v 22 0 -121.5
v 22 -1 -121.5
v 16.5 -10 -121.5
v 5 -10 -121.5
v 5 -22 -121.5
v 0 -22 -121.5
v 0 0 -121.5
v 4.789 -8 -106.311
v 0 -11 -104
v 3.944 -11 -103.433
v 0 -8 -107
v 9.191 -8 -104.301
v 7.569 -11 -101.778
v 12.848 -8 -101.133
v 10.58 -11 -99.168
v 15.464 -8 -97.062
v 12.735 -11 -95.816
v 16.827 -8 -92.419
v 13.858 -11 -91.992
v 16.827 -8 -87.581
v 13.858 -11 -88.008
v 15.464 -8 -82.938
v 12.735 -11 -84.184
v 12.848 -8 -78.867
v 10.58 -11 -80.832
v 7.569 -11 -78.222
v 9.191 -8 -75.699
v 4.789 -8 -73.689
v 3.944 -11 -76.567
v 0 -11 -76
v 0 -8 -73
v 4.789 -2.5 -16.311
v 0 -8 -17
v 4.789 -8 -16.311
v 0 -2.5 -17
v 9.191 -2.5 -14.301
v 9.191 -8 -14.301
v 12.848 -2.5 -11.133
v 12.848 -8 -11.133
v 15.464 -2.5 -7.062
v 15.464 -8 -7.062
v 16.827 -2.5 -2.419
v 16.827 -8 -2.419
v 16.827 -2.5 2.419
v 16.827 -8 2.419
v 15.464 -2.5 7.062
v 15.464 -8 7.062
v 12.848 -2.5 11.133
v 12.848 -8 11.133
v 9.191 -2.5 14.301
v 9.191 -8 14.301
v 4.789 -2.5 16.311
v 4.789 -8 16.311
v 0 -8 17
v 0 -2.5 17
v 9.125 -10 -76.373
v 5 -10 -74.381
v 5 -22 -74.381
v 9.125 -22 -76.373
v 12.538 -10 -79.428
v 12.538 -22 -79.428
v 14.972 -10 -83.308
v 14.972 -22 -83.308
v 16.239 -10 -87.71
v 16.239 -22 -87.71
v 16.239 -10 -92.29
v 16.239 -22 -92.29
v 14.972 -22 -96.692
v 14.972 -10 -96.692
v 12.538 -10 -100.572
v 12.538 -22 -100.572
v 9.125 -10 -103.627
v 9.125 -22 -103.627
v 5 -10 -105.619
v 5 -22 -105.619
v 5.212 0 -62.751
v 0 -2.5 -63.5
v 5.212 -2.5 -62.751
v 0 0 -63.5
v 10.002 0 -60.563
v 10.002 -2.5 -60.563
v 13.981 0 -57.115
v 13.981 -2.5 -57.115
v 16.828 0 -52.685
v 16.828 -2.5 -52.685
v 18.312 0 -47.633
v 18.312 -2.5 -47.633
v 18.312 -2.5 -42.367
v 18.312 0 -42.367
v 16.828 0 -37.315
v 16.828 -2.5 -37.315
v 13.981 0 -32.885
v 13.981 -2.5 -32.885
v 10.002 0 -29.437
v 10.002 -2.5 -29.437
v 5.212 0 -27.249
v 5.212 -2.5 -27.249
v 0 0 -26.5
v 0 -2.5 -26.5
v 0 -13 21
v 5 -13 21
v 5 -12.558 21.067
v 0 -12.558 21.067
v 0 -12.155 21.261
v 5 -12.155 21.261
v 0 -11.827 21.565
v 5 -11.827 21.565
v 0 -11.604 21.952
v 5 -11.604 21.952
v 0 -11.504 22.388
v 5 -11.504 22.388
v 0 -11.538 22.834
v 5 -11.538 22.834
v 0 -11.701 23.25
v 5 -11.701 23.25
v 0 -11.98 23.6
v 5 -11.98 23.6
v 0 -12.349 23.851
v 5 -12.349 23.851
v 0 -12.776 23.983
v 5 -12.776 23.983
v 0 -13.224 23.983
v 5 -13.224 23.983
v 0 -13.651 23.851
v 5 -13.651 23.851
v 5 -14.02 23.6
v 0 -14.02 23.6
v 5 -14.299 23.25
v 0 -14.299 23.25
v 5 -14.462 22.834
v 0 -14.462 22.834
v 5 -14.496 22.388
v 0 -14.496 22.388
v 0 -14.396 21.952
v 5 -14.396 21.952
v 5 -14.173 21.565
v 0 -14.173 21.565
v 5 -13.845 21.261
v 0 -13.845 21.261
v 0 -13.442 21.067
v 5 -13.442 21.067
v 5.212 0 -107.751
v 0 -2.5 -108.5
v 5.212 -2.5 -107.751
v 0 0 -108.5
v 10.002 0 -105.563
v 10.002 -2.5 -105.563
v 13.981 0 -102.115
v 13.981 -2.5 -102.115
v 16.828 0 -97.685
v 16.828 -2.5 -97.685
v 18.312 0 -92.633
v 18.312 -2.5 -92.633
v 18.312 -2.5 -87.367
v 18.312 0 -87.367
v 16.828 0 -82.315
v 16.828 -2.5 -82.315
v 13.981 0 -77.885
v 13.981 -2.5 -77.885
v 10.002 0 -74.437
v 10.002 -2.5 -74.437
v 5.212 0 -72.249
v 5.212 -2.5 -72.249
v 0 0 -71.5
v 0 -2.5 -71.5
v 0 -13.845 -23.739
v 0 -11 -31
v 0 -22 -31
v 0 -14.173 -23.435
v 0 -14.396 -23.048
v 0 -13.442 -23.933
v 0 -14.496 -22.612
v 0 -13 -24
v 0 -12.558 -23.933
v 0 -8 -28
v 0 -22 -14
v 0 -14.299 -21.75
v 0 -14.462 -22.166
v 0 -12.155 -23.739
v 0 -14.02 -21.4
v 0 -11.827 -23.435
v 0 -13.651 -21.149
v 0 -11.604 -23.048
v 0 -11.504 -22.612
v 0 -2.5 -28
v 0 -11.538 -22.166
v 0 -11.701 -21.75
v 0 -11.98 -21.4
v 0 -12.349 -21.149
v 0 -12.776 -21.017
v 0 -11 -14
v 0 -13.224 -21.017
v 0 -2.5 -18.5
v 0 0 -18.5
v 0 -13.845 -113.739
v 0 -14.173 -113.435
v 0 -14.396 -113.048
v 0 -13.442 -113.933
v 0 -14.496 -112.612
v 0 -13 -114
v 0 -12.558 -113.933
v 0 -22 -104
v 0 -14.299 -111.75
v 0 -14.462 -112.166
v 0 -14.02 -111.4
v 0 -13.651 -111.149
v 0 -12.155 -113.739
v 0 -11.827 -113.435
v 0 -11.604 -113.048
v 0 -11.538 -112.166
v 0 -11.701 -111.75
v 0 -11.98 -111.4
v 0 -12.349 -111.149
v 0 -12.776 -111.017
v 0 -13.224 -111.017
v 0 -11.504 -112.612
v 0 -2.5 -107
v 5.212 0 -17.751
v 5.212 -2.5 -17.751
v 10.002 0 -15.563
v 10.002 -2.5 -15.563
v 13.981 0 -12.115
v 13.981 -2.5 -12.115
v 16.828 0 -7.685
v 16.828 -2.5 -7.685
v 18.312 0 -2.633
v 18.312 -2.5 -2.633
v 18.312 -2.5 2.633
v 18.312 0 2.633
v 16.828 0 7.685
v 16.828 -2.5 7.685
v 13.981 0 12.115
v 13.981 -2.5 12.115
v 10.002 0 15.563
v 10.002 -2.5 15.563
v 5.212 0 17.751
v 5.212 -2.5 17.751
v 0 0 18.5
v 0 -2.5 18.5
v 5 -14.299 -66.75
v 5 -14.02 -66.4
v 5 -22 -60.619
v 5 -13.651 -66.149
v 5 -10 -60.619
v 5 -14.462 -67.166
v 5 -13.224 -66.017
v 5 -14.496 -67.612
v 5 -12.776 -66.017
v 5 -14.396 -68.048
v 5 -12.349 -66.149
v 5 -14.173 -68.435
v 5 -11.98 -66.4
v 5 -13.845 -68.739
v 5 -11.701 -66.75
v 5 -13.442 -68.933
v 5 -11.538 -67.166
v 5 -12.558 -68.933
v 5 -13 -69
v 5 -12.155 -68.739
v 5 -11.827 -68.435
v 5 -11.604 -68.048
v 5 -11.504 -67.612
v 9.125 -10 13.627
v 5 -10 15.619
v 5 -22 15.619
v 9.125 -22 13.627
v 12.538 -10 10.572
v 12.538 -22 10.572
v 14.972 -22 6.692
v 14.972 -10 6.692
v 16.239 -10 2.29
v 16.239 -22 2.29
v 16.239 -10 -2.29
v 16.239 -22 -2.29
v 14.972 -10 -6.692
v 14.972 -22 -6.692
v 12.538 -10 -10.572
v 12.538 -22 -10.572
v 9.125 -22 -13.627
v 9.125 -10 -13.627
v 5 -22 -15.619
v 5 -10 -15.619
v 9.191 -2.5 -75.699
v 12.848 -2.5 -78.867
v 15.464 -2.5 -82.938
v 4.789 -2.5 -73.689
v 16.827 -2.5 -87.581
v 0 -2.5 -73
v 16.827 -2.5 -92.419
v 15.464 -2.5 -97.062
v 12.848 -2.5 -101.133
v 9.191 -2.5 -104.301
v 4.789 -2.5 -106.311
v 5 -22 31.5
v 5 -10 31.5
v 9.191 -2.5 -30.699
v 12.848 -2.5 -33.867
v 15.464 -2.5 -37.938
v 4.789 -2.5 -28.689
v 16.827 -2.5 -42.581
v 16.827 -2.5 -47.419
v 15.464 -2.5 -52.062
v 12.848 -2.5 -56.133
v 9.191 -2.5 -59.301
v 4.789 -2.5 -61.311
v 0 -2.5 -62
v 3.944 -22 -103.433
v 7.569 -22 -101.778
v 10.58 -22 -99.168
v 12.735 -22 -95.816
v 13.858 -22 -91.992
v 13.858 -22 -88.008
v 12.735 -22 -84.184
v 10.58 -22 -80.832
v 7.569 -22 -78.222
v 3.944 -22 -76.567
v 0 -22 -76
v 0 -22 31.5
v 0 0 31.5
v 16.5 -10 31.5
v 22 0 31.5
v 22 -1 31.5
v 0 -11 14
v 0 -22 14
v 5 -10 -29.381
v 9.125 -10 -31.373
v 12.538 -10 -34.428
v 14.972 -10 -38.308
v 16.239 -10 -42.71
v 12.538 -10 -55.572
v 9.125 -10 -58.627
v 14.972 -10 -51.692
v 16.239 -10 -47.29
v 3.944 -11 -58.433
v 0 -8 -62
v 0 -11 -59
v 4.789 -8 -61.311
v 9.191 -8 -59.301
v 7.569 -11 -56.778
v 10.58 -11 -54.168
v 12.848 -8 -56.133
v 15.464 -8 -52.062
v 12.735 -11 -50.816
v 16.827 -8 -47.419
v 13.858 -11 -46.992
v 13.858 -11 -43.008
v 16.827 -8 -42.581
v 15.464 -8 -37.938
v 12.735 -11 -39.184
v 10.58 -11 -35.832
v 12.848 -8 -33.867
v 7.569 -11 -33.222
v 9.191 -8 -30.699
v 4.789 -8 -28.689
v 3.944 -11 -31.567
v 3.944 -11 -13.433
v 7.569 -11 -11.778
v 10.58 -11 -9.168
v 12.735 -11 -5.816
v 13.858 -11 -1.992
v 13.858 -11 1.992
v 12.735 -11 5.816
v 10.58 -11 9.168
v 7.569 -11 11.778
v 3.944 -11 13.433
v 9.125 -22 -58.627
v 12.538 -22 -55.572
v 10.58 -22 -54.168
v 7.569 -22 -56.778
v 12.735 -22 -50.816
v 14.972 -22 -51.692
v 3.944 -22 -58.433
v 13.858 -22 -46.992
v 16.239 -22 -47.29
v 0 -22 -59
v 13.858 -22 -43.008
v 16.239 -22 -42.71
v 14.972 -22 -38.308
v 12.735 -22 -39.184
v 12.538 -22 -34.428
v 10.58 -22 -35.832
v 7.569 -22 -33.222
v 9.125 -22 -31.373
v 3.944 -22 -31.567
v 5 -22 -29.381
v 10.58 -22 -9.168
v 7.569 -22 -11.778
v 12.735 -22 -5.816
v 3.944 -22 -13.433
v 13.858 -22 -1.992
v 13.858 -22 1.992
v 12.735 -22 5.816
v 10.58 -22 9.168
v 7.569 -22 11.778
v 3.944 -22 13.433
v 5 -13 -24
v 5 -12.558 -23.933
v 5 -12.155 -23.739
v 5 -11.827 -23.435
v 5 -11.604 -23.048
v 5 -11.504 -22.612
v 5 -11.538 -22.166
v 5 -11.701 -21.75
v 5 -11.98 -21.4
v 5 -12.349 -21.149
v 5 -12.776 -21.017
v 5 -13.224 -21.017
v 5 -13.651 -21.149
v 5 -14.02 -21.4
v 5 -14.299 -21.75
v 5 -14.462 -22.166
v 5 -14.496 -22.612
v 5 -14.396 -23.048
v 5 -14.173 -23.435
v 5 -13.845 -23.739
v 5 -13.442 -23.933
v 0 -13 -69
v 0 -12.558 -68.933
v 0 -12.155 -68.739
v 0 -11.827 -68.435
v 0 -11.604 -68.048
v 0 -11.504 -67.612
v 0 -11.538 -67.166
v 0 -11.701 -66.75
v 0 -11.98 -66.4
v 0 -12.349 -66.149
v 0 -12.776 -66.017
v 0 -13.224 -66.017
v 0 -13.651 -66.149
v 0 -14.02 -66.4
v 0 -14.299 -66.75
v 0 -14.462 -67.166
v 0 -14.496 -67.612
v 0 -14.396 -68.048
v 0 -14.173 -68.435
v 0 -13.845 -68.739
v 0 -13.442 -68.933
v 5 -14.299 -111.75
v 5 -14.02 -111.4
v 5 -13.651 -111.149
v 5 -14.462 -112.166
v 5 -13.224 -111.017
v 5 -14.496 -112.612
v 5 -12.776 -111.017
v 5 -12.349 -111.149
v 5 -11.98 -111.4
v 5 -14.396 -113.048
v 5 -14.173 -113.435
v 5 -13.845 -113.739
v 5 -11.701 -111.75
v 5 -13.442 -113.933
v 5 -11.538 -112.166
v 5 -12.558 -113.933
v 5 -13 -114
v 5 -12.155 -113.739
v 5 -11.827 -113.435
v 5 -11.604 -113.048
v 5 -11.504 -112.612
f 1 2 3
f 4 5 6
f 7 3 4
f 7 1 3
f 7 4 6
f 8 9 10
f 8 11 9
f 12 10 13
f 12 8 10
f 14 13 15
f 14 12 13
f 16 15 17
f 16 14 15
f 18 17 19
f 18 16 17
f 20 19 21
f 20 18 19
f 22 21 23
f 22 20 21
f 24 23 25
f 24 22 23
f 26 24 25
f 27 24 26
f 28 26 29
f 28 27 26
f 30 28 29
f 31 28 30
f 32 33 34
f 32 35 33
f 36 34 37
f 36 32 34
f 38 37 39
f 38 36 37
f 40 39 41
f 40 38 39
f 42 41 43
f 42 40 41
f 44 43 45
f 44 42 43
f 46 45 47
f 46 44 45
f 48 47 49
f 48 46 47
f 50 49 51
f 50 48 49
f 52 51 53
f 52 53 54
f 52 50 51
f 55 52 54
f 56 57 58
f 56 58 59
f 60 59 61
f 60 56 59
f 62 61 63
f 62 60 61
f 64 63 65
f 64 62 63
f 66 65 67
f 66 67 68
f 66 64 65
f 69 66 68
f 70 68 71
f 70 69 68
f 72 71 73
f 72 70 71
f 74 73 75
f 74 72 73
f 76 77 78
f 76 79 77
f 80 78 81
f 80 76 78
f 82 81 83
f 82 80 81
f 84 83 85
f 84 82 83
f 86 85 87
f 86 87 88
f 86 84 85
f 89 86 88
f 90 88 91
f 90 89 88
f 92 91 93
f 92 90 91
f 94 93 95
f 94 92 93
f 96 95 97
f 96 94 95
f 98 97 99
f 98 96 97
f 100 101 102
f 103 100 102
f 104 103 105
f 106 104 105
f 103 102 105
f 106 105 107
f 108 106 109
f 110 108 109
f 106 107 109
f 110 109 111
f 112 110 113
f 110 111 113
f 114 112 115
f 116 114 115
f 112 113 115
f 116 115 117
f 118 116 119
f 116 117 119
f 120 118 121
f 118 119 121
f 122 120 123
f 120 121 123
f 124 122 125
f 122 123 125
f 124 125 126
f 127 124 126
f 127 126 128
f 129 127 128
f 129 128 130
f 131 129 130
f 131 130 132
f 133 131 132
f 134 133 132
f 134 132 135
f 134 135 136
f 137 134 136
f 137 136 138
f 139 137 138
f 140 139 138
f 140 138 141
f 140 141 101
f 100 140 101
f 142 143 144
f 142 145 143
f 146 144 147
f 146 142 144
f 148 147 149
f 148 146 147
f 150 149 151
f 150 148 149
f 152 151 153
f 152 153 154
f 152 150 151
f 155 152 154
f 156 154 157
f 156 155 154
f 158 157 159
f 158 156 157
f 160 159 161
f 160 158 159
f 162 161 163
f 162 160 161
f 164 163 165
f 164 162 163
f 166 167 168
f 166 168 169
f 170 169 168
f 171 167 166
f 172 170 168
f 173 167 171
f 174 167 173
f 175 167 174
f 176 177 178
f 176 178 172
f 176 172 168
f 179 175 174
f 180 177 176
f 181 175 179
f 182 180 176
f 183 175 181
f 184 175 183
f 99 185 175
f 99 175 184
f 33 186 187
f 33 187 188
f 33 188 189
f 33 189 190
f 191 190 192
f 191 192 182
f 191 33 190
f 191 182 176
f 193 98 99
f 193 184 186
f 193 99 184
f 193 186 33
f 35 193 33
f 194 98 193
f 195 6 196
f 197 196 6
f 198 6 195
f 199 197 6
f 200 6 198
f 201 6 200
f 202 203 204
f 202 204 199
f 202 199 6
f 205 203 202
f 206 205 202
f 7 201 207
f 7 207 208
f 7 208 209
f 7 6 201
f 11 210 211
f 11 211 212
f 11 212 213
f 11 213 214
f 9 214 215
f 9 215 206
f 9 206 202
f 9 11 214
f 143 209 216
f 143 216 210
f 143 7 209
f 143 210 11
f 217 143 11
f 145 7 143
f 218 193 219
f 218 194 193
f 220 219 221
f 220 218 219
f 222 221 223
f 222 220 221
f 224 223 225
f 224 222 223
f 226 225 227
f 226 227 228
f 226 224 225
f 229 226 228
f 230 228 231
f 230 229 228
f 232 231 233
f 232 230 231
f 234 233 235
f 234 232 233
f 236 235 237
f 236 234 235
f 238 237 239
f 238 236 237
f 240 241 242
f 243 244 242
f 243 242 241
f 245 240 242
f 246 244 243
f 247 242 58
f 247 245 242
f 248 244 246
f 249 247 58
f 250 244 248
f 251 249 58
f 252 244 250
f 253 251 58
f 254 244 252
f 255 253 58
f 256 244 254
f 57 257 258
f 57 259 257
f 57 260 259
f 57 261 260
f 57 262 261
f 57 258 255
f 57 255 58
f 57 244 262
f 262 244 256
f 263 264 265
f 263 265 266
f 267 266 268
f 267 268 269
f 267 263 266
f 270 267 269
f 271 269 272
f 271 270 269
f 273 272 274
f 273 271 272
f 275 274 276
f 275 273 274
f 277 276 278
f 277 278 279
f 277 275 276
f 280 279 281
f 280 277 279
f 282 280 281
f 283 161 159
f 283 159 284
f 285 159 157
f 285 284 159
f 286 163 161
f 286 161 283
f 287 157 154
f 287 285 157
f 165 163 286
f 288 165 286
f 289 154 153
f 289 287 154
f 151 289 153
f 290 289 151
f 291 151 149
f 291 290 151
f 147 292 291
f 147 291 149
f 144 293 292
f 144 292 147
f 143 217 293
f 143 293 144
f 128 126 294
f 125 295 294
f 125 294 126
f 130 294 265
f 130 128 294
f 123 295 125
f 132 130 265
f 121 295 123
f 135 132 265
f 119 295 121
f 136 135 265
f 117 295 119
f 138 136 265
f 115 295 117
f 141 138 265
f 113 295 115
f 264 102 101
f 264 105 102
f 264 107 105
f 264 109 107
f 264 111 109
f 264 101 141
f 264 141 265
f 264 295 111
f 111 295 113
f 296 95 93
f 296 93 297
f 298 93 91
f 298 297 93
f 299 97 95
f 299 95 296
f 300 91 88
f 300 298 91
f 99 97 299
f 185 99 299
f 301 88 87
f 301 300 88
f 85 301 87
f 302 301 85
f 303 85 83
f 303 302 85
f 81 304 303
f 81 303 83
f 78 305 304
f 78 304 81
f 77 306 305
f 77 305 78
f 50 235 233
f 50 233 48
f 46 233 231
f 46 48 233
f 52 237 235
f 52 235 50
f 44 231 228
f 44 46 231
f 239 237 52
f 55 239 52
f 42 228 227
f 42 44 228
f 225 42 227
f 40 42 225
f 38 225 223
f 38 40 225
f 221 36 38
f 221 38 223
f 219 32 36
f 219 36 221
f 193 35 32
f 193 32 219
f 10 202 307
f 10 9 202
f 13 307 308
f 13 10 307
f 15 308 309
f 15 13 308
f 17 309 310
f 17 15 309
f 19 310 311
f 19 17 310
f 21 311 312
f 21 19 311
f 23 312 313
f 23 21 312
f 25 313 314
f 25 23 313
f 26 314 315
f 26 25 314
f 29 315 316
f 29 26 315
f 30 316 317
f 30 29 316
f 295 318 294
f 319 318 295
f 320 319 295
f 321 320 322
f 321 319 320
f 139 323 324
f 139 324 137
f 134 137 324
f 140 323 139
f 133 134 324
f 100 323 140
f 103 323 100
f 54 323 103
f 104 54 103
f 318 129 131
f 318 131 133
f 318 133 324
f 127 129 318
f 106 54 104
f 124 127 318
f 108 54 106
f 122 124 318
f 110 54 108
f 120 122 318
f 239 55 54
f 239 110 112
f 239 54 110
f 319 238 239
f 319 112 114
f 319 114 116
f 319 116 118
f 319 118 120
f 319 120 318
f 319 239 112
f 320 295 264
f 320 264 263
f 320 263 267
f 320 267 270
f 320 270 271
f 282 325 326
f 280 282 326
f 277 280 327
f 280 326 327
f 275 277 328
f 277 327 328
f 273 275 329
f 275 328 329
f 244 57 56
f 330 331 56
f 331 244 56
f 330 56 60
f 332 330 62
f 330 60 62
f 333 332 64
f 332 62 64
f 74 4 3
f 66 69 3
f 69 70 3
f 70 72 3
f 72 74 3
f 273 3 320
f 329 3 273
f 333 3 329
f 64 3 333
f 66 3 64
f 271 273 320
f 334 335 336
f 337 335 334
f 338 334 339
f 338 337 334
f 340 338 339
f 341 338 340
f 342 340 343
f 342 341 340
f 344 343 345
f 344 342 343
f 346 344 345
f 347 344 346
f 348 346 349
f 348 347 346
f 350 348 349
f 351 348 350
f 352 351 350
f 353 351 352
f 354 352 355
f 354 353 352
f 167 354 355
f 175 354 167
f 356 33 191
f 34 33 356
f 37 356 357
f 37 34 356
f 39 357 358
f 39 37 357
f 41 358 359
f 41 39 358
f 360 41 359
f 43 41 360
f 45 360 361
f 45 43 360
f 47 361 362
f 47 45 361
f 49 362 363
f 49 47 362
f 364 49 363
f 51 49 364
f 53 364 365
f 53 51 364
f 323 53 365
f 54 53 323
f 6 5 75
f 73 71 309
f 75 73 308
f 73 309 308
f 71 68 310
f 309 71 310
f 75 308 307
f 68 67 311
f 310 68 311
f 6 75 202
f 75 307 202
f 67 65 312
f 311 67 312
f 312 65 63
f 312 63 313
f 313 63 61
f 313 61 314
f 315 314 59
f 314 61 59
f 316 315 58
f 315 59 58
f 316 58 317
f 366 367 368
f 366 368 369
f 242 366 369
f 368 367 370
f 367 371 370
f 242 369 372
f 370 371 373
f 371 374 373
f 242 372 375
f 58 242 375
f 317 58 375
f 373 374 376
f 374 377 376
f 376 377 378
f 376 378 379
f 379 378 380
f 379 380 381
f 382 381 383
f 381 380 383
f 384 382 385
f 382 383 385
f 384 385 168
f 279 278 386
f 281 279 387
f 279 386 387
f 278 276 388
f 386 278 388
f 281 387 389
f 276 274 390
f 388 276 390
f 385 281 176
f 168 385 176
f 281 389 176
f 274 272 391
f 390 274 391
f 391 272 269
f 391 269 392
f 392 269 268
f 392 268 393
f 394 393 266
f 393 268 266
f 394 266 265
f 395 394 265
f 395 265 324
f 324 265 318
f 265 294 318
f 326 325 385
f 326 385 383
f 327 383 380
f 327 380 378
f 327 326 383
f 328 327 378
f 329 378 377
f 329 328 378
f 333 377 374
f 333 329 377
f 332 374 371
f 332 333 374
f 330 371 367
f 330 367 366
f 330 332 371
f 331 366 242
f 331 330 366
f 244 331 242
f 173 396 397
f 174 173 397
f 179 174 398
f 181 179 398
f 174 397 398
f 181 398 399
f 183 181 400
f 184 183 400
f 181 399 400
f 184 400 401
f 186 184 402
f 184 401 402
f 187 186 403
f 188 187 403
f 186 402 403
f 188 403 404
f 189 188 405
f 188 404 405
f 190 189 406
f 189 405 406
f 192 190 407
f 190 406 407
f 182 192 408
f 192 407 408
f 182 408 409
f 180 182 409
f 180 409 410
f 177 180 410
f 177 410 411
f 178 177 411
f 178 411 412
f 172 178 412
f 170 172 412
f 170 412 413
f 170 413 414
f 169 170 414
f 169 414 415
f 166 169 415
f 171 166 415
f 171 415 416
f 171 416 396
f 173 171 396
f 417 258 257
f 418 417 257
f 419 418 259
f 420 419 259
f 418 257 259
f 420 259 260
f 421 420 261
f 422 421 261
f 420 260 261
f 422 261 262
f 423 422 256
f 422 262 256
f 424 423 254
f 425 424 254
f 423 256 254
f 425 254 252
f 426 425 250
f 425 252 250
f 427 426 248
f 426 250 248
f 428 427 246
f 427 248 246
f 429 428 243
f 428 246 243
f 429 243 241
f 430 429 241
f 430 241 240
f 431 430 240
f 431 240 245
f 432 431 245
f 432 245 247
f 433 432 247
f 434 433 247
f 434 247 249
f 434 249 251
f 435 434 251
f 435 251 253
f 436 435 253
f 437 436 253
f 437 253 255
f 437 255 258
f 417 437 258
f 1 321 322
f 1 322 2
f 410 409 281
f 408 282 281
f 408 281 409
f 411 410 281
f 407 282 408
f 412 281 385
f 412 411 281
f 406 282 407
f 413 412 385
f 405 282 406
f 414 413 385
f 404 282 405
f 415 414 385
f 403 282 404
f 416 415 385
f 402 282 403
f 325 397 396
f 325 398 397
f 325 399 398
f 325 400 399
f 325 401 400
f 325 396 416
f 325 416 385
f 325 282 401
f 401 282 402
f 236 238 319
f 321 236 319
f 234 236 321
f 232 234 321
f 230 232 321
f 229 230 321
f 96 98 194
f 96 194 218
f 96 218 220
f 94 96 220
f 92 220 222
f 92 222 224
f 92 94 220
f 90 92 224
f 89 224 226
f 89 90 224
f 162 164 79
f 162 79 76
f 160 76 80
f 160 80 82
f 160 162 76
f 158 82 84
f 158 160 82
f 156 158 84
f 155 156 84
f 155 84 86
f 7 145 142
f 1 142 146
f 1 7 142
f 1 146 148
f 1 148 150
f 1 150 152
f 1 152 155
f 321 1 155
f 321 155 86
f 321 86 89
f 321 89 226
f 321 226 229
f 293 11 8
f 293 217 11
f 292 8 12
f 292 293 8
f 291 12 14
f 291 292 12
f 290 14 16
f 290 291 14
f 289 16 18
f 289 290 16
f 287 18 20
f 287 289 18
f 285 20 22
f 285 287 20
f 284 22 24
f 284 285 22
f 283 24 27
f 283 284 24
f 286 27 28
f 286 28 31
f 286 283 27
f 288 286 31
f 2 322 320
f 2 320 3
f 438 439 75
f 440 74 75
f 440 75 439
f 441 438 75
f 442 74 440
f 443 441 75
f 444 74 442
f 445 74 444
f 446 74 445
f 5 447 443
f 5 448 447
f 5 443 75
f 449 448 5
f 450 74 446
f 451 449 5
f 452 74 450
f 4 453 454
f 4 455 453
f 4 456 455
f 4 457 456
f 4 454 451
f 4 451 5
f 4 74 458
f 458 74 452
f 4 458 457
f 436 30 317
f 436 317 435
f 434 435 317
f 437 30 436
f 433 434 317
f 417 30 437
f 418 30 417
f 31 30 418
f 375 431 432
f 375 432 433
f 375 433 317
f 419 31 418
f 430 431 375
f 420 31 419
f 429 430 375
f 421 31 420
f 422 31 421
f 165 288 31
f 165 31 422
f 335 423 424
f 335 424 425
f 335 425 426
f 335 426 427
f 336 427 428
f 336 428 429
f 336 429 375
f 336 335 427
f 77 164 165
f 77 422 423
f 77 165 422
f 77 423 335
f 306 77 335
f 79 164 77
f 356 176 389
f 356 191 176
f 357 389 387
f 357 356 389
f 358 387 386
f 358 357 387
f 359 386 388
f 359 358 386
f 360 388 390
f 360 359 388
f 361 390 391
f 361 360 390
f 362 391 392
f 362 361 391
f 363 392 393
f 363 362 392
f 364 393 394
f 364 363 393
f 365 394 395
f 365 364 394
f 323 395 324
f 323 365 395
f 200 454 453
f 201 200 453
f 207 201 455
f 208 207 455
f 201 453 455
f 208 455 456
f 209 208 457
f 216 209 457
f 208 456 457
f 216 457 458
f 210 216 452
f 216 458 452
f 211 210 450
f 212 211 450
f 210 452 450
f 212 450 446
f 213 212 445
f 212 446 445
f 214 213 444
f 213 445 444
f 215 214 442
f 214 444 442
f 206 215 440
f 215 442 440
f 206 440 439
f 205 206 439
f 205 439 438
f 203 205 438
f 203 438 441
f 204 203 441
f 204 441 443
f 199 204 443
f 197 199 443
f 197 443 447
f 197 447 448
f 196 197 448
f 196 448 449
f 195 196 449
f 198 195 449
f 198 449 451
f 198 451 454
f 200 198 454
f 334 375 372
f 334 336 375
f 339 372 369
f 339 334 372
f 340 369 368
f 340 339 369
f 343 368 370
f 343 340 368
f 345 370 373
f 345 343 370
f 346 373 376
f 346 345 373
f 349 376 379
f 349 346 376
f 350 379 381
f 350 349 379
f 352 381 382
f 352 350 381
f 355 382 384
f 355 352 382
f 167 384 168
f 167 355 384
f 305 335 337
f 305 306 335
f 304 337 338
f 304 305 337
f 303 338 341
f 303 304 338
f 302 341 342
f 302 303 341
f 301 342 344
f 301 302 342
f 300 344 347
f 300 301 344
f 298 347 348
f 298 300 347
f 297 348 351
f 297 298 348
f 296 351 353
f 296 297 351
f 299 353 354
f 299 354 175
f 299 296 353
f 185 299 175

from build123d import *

# Parameters (mm, degrees)
BOSS_EXTRUDE1_DEPTH = 10
BOSS_EXTRUDE2_DEPTH = 12
CHAMFER2_SIZE       = 5.5
CHAMFER2_SIZE2      = 9
SKETCH6_W           = 14
SKETCH6_H           = 15
SKETCH6_W_2         = 17
SKETCH6_H_2         = 2.5
SKETCH6_W_3         = 1.5
LPATTERN3_COUNT     = 3
LPATTERN3_PITCH     = 45
SKETCH7_R           = 1.5
CUT_EXTRUDE1_DEPTH  = 10
LPATTERN4_COUNT     = 3
LPATTERN4_PITCH     = 45
LPATTERN5_COUNT     = 2
LPATTERN5_PITCH     = 45


with BuildPart() as part:
    # Sketch1 → Boss-Extrude1 (new body)
    with BuildSketch(Plane(origin=(0, 0, 0), x_dir=(1, 0, 0), z_dir=(0, 1, 0))):
        with BuildLine():
            Line((0, -11.4), (0, -31.5))
            Line((0, -31.5), (22, -31.5))
            Line((22, -31.5), (22, 121.5))
            Line((22, 121.5), (0, 121.5))
            Line((0, 121.5), (0, 101.4))
            ThreePointArc((0, 101.4), (11.4, 90), (0, 78.6))
            Line((0, 78.6), (0, 56.4))
            ThreePointArc((0, 56.4), (11.4, 45), (0, 33.6))
            Line((0, 33.6), (0, 11.4))
            ThreePointArc((0, 11.4), (11.4, 0), (0, -11.4))
        make_face()
    extrude(amount=-BOSS_EXTRUDE1_DEPTH)

    # Sketch3 → Boss-Extrude2 (add)
    with BuildSketch(Plane.XZ.offset(10)):
        with BuildLine():
            Line((0, -121.5), (0, -101.4))
            ThreePointArc((0, -101.4), (11.4, -90), (0, -78.6))
            Line((0, -78.6), (0, -56.4))
            ThreePointArc((0, -56.4), (11.4, -45), (0, -33.6))
            Line((0, -33.6), (0, -11.4))
            ThreePointArc((0, -11.4), (11.4, 0), (0, 11.4))
            Line((0, 11.4), (0, 31.5))
            Line((0, 31.5), (5, 31.5))
            Line((5, 31.5), (5, 15.619218931))
            ThreePointArc((5, 15.619218931), (16.4, 0), (5, -15.619218931))
            Line((5, -15.619218931), (5, -29.380781069))
            ThreePointArc((5, -29.380781069), (16.4, -45), (5, -60.619218931))
            Line((5, -60.619218931), (5, -74.380781069))
            ThreePointArc((5, -74.380781069), (16.4, -90), (5, -105.619218931))
            Line((5, -105.619218931), (5, -121.5))
            Line((5, -121.5), (0, -121.5))
        make_face()
    extrude(amount=BOSS_EXTRUDE2_DEPTH)

    # Chamfer2
    chamfer2_edges = [part.edges().sort_by_distance(p)[0] for p in [
        (22, -10, -45),
    ]]
    chamfer2_side = [part.faces().sort_by_distance(p)[0] for p in [
        (6.539415473, -10, 23.559609465),
    ]]
    chamfer(chamfer2_edges, length=CHAMFER2_SIZE, length2=CHAMFER2_SIZE2, reference=chamfer2_side[0])

    # Sketch6 → Cut-Revolve6 (revolve, cut)
    with BuildSketch(Plane.ZY):
        with Locations((-83, -18.5)):
            Rectangle(SKETCH6_W, SKETCH6_H)
        Polygon((-90, -11), (-76, -11), (-73, -8), (-73, -2.5), (-90, -2.5), align=None)
        with Locations((-81.5, -1.25)):
            Rectangle(SKETCH6_W_2, SKETCH6_H_2)
        with Locations((-72.25, -1.25)):
            Rectangle(SKETCH6_W_3, SKETCH6_H_2)
    cut_revolve6 = revolve(axis=Axis((0, 0, -90), (0, -1, 0)), mode=Mode.SUBTRACT)

    # LPattern3: Cut-Revolve6 ×3
    with Locations(*[(0, 0, i * LPATTERN3_PITCH) for i in range(1, LPATTERN3_COUNT)]):
        add(cut_revolve6, mode=Mode.SUBTRACT)

    # Sketch7 → Cut-Extrude1 (cut)
    with BuildSketch(Plane(origin=(5, 0, 0), x_dir=(0, 0, -1), z_dir=(1, 0, 0))):
        with Locations((67.5, -13)):
            Circle(SKETCH7_R)
    cut_extrude1 = extrude(amount=-CUT_EXTRUDE1_DEPTH, mode=Mode.SUBTRACT)

    # LPattern4: Cut-Extrude1 ×3
    with Locations(*[(0, 0, i * LPATTERN4_PITCH) for i in range(1, LPATTERN4_COUNT)]):
        add(cut_extrude1, mode=Mode.SUBTRACT)

    # LPattern5: Cut-Extrude1 ×2
    with Locations(*[(0, 0, -i * LPATTERN5_PITCH) for i in range(1, LPATTERN5_COUNT)]):
        add(cut_extrude1, mode=Mode.SUBTRACT)


solid = part.part
